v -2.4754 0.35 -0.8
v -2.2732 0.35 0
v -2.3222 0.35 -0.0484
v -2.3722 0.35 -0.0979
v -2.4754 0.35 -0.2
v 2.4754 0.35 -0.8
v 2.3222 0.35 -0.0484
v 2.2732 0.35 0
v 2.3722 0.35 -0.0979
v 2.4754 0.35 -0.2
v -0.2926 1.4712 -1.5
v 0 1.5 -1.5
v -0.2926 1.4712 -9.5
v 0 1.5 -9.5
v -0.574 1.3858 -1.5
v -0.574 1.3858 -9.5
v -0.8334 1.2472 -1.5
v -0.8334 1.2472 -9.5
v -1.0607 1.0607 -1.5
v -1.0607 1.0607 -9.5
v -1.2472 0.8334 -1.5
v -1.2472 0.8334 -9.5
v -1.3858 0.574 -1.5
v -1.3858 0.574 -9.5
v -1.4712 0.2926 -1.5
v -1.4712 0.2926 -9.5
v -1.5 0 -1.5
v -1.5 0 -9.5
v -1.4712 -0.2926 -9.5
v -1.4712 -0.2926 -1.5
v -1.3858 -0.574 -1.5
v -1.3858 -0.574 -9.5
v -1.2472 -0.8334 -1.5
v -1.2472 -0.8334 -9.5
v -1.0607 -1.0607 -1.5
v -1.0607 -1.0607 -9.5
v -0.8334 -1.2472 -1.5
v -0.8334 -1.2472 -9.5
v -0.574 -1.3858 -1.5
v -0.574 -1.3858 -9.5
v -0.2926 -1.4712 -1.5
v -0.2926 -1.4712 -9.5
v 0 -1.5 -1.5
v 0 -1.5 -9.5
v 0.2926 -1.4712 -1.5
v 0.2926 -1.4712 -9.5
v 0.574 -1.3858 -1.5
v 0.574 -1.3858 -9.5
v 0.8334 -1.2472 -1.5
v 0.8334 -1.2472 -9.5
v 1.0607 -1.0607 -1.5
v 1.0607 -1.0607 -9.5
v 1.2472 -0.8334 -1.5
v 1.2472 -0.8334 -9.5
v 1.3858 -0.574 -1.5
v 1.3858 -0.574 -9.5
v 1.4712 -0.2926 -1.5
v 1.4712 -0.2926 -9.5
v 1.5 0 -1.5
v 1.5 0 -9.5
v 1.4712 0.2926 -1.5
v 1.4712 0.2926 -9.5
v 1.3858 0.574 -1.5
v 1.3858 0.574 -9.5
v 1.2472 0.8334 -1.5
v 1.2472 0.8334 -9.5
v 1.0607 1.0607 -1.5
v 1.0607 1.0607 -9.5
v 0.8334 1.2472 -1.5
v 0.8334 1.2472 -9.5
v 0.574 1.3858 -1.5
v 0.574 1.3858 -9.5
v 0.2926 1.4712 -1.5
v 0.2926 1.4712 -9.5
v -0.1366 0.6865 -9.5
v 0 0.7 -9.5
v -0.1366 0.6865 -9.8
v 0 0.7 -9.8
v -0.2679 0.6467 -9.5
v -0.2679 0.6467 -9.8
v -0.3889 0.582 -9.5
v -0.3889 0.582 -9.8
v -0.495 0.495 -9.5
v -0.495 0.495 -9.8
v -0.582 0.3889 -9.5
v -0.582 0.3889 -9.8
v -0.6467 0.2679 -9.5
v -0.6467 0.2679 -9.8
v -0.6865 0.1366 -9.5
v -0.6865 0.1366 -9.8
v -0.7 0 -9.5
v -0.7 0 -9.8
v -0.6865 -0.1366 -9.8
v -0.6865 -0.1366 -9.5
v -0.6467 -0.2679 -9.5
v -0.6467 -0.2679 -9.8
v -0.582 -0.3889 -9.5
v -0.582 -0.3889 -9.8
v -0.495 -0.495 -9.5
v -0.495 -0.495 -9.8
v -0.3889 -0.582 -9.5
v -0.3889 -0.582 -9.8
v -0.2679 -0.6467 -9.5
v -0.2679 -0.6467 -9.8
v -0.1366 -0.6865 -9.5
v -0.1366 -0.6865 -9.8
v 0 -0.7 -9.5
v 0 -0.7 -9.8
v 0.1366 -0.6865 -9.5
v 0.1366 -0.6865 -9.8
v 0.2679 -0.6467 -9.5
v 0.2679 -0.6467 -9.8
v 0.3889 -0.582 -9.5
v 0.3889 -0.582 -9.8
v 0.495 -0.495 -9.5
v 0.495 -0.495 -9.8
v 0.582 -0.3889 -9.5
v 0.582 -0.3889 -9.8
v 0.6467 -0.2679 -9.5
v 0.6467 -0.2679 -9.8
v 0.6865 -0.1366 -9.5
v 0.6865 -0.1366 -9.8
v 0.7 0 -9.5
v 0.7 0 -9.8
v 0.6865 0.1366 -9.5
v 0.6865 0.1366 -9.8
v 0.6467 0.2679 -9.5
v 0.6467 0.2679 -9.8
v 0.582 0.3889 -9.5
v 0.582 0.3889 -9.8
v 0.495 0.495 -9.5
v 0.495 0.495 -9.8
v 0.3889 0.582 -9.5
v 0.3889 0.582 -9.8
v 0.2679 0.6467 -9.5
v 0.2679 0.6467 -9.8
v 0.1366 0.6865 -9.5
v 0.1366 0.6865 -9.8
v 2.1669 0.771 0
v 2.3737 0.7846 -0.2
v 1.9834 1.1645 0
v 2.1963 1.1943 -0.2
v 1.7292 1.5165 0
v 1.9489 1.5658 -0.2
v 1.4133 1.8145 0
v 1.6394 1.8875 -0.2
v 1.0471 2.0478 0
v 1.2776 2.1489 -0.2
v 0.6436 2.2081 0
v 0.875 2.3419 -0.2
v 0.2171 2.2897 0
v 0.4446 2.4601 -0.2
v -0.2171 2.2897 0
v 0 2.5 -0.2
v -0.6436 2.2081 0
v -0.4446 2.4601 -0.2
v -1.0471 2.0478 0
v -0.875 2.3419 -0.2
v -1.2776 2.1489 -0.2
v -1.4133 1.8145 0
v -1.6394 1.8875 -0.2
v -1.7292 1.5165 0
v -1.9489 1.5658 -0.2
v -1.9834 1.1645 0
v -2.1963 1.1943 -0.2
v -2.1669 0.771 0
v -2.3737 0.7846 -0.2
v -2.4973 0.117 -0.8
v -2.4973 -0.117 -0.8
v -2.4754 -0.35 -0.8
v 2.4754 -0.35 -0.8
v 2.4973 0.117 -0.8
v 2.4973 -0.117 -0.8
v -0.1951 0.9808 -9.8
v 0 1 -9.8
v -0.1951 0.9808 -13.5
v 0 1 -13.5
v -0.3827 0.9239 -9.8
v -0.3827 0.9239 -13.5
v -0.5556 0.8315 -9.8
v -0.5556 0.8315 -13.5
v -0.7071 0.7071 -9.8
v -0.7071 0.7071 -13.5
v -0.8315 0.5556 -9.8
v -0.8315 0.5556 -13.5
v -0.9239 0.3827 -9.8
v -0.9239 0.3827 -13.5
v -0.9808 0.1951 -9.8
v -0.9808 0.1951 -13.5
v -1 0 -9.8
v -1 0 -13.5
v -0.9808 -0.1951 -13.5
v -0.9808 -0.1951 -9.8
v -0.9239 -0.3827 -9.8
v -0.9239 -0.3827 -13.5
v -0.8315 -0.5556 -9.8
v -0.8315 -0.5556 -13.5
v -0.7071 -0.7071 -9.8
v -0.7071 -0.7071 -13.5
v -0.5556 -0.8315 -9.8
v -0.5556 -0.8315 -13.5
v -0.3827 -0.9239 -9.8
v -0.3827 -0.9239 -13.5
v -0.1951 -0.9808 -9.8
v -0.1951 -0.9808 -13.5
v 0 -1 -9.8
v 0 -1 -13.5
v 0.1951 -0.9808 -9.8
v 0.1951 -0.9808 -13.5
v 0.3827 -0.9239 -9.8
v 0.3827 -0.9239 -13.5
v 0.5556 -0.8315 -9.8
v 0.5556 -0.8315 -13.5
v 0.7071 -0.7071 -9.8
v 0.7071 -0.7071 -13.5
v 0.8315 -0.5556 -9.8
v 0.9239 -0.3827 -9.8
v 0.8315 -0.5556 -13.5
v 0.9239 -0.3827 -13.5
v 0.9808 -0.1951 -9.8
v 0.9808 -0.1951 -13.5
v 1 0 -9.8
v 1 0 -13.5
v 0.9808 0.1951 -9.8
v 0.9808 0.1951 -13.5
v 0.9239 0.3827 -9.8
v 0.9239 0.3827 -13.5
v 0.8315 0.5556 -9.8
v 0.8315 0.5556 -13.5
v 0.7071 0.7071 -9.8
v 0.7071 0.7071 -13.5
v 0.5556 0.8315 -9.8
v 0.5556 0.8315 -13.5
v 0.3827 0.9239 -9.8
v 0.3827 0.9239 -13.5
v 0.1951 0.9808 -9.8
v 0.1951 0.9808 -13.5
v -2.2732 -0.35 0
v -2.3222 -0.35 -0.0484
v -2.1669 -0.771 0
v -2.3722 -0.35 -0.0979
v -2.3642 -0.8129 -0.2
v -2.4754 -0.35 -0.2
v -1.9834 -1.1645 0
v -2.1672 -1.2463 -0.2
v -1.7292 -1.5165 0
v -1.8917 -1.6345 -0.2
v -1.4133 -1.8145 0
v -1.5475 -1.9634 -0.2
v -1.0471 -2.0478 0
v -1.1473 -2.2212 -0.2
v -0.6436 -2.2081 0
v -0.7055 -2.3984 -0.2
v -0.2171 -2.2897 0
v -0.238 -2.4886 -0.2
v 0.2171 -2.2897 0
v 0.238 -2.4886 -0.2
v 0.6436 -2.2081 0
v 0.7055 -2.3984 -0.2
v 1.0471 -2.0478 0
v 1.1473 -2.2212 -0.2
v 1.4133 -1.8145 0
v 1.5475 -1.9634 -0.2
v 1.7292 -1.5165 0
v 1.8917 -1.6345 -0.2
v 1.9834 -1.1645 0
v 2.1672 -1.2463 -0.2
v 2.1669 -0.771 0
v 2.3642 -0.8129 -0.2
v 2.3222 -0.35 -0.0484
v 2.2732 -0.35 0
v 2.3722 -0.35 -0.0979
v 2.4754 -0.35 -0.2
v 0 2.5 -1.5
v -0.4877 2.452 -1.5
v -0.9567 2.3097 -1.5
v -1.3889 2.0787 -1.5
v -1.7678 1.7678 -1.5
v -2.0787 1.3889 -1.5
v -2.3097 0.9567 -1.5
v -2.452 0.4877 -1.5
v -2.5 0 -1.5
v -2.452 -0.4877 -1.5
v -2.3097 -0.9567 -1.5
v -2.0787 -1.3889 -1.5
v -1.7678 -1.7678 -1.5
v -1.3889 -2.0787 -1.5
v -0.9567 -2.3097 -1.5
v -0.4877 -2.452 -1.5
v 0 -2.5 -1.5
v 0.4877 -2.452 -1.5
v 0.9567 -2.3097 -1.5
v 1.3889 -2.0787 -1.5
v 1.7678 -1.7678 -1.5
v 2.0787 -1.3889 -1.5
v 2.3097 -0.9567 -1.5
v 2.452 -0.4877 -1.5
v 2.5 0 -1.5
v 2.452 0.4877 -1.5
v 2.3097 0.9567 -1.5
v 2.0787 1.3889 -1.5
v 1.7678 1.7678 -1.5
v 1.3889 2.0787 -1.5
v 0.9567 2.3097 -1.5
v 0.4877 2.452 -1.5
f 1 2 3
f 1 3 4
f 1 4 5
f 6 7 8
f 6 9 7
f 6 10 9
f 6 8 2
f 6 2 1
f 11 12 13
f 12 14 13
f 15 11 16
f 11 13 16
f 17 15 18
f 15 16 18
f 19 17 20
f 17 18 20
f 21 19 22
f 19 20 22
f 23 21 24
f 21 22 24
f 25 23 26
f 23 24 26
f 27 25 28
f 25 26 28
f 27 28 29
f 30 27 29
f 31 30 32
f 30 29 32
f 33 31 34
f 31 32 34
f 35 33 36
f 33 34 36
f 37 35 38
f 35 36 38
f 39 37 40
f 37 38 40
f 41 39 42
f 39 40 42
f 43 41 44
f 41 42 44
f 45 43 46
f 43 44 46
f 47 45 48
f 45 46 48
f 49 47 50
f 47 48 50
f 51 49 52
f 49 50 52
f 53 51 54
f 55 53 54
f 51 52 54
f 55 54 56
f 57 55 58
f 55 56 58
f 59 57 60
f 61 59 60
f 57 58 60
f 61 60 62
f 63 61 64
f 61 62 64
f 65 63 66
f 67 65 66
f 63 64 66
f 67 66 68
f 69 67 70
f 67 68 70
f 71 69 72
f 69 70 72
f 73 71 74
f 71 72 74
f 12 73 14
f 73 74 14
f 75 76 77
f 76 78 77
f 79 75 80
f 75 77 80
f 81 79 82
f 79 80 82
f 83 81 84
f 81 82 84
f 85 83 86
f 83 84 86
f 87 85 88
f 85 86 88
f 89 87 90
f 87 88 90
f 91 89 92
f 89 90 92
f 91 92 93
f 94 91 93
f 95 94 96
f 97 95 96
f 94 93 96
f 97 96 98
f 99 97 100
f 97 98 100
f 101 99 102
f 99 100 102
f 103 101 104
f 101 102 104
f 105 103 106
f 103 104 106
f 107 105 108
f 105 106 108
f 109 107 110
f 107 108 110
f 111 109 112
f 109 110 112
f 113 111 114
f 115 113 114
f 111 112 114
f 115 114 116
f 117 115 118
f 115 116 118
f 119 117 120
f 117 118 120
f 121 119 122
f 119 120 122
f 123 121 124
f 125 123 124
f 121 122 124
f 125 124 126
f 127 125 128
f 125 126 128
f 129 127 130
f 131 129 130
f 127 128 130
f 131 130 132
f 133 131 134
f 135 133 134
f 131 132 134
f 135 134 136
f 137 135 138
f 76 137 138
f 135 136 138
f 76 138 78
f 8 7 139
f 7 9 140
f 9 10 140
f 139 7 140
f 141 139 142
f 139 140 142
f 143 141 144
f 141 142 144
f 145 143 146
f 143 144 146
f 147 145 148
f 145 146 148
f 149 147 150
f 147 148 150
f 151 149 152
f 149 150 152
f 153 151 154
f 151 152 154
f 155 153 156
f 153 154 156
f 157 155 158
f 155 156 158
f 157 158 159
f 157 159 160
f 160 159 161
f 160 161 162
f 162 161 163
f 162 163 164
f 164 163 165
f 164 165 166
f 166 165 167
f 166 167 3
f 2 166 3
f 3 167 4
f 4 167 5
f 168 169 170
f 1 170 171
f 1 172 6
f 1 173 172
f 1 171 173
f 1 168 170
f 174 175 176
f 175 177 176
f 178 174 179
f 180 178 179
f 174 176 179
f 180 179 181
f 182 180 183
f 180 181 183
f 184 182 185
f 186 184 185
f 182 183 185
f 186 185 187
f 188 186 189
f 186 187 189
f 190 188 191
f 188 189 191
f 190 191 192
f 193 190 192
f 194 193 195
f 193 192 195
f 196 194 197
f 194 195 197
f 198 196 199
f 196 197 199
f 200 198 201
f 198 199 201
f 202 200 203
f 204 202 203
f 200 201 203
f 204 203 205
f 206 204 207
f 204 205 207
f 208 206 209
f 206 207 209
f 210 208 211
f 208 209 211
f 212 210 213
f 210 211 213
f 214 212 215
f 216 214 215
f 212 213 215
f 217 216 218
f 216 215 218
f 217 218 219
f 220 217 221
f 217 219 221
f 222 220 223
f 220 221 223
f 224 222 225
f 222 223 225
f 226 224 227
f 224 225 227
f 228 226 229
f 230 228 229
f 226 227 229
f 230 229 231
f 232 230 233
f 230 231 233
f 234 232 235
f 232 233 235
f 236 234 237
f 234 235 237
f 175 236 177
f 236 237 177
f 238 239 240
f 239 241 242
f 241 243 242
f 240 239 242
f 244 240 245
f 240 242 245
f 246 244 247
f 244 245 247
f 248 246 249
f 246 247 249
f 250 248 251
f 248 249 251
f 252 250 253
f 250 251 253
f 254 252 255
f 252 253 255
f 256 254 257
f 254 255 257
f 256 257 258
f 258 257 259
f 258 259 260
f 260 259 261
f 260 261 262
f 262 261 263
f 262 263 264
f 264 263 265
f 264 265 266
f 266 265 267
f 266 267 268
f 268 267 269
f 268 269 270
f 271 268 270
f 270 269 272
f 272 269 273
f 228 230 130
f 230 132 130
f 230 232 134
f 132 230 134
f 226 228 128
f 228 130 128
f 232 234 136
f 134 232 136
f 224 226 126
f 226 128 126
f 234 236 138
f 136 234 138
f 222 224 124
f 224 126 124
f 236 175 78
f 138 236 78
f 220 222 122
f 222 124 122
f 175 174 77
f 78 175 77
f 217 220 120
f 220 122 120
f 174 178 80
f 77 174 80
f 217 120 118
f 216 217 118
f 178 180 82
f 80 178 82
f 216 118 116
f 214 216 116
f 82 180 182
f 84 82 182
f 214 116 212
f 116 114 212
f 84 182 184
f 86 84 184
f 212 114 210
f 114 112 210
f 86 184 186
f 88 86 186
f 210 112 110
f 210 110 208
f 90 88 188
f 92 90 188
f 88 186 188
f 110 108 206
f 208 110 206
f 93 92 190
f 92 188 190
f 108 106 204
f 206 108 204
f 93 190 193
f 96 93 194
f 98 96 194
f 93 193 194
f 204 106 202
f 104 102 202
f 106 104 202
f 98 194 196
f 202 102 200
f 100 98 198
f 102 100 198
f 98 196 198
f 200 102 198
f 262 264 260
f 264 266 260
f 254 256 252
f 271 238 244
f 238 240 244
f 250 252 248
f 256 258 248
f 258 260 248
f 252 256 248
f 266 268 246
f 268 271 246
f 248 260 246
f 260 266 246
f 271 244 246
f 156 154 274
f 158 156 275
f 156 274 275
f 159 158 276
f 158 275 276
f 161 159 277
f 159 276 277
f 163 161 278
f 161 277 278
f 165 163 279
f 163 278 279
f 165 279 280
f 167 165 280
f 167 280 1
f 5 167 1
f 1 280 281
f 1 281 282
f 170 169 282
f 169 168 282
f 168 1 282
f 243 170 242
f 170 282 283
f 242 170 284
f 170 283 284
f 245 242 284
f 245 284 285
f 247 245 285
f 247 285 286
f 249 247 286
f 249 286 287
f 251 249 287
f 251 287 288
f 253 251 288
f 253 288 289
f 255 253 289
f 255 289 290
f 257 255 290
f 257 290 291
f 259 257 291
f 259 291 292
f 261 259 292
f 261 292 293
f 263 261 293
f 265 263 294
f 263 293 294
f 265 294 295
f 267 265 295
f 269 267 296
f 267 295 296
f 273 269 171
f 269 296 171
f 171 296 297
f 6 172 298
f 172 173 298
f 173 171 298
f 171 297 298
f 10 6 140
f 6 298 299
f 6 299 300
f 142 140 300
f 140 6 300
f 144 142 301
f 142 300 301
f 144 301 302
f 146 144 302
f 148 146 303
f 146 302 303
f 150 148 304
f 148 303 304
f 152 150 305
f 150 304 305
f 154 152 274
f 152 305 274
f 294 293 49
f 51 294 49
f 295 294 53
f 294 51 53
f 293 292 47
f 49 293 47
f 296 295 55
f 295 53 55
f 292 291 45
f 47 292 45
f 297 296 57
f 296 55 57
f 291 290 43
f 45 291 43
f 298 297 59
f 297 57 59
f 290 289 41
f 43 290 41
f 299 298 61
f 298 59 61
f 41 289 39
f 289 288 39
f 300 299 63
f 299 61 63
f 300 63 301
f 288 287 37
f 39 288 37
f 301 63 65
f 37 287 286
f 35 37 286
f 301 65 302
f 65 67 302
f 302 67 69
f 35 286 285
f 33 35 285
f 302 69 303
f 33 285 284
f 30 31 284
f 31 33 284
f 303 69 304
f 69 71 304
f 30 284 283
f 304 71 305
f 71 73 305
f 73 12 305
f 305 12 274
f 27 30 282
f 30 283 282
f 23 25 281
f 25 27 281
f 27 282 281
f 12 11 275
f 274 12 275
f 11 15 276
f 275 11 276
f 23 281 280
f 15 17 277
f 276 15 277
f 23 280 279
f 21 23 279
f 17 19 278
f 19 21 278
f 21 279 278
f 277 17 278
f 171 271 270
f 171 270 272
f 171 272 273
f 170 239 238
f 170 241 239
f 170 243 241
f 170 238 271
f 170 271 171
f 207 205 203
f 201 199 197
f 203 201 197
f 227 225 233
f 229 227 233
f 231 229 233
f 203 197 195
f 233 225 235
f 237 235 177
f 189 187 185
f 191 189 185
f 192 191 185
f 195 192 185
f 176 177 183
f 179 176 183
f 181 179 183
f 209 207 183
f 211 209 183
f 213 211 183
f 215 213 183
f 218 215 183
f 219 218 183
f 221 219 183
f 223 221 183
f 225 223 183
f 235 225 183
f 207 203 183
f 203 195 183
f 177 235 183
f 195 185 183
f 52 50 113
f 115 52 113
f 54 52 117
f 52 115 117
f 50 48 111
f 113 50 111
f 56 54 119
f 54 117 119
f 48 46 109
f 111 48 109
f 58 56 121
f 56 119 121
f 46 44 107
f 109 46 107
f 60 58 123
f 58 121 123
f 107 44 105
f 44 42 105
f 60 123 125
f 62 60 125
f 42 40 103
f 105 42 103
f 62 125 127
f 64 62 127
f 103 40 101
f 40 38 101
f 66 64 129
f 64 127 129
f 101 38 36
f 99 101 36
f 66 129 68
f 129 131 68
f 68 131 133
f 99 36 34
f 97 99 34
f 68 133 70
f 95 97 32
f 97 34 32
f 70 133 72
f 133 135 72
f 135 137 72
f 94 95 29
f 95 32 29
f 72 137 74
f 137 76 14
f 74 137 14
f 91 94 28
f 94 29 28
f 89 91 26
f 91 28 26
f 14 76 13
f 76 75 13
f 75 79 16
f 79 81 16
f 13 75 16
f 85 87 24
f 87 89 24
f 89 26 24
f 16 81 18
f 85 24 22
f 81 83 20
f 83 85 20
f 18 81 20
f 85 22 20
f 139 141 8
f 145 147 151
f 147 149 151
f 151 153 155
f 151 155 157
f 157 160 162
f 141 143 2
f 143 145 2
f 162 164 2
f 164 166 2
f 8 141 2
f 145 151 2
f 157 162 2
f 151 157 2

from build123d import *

# Parameters (mm, degrees)
SKETCH_2_W               = 1.6
SKETCH_2_H               = 0.7
CUT_EXTRUDE_1_DEPTH      = 3.5
CUT_EXTRUDE_1_DEPTH_BACK = 3.5
CHAMFER_1_SIZE           = 0.2


with BuildPart() as part:
    # 草图1 → 旋转1 (revolve)
    with BuildSketch(Plane(origin=(0, 0, 0), x_dir=(0, 0, -1), z_dir=(1, 0, 0))):
        Polygon((0, 0), (0, 2.5), (1.5, 2.5), (1.5, 1.5), (9.5, 1.5), (9.5, 0.7), (9.8, 0.7), (9.8, 1), (13.5, 1), (13.5, 0), align=None)
    revolve(axis=Axis((0, 0, -13.5), (0, 0, 1)))

    # 草图2 → 切除-拉伸1 (cut, two sides)
    with BuildSketch(Plane(origin=(0, 0, 0), x_dir=(0, 0, -1), z_dir=(1, 0, 0))) as cut_extrude_1_sk:
        Rectangle(SKETCH_2_W, SKETCH_2_H)
    extrude(amount=CUT_EXTRUDE_1_DEPTH, mode=Mode.SUBTRACT)
    extrude(cut_extrude_1_sk.sketch, amount=-CUT_EXTRUDE_1_DEPTH_BACK, mode=Mode.SUBTRACT)

    # 倒角1
    chamfer_1_edges = [part.edges().sort_by_distance(p)[0] for p in [
        (0, -2.5, 0),
        (-1.639359631, 1.887458609, 0),
    ]]
    chamfer(chamfer_1_edges, length=CHAMFER_1_SIZE)


solid = part.part
